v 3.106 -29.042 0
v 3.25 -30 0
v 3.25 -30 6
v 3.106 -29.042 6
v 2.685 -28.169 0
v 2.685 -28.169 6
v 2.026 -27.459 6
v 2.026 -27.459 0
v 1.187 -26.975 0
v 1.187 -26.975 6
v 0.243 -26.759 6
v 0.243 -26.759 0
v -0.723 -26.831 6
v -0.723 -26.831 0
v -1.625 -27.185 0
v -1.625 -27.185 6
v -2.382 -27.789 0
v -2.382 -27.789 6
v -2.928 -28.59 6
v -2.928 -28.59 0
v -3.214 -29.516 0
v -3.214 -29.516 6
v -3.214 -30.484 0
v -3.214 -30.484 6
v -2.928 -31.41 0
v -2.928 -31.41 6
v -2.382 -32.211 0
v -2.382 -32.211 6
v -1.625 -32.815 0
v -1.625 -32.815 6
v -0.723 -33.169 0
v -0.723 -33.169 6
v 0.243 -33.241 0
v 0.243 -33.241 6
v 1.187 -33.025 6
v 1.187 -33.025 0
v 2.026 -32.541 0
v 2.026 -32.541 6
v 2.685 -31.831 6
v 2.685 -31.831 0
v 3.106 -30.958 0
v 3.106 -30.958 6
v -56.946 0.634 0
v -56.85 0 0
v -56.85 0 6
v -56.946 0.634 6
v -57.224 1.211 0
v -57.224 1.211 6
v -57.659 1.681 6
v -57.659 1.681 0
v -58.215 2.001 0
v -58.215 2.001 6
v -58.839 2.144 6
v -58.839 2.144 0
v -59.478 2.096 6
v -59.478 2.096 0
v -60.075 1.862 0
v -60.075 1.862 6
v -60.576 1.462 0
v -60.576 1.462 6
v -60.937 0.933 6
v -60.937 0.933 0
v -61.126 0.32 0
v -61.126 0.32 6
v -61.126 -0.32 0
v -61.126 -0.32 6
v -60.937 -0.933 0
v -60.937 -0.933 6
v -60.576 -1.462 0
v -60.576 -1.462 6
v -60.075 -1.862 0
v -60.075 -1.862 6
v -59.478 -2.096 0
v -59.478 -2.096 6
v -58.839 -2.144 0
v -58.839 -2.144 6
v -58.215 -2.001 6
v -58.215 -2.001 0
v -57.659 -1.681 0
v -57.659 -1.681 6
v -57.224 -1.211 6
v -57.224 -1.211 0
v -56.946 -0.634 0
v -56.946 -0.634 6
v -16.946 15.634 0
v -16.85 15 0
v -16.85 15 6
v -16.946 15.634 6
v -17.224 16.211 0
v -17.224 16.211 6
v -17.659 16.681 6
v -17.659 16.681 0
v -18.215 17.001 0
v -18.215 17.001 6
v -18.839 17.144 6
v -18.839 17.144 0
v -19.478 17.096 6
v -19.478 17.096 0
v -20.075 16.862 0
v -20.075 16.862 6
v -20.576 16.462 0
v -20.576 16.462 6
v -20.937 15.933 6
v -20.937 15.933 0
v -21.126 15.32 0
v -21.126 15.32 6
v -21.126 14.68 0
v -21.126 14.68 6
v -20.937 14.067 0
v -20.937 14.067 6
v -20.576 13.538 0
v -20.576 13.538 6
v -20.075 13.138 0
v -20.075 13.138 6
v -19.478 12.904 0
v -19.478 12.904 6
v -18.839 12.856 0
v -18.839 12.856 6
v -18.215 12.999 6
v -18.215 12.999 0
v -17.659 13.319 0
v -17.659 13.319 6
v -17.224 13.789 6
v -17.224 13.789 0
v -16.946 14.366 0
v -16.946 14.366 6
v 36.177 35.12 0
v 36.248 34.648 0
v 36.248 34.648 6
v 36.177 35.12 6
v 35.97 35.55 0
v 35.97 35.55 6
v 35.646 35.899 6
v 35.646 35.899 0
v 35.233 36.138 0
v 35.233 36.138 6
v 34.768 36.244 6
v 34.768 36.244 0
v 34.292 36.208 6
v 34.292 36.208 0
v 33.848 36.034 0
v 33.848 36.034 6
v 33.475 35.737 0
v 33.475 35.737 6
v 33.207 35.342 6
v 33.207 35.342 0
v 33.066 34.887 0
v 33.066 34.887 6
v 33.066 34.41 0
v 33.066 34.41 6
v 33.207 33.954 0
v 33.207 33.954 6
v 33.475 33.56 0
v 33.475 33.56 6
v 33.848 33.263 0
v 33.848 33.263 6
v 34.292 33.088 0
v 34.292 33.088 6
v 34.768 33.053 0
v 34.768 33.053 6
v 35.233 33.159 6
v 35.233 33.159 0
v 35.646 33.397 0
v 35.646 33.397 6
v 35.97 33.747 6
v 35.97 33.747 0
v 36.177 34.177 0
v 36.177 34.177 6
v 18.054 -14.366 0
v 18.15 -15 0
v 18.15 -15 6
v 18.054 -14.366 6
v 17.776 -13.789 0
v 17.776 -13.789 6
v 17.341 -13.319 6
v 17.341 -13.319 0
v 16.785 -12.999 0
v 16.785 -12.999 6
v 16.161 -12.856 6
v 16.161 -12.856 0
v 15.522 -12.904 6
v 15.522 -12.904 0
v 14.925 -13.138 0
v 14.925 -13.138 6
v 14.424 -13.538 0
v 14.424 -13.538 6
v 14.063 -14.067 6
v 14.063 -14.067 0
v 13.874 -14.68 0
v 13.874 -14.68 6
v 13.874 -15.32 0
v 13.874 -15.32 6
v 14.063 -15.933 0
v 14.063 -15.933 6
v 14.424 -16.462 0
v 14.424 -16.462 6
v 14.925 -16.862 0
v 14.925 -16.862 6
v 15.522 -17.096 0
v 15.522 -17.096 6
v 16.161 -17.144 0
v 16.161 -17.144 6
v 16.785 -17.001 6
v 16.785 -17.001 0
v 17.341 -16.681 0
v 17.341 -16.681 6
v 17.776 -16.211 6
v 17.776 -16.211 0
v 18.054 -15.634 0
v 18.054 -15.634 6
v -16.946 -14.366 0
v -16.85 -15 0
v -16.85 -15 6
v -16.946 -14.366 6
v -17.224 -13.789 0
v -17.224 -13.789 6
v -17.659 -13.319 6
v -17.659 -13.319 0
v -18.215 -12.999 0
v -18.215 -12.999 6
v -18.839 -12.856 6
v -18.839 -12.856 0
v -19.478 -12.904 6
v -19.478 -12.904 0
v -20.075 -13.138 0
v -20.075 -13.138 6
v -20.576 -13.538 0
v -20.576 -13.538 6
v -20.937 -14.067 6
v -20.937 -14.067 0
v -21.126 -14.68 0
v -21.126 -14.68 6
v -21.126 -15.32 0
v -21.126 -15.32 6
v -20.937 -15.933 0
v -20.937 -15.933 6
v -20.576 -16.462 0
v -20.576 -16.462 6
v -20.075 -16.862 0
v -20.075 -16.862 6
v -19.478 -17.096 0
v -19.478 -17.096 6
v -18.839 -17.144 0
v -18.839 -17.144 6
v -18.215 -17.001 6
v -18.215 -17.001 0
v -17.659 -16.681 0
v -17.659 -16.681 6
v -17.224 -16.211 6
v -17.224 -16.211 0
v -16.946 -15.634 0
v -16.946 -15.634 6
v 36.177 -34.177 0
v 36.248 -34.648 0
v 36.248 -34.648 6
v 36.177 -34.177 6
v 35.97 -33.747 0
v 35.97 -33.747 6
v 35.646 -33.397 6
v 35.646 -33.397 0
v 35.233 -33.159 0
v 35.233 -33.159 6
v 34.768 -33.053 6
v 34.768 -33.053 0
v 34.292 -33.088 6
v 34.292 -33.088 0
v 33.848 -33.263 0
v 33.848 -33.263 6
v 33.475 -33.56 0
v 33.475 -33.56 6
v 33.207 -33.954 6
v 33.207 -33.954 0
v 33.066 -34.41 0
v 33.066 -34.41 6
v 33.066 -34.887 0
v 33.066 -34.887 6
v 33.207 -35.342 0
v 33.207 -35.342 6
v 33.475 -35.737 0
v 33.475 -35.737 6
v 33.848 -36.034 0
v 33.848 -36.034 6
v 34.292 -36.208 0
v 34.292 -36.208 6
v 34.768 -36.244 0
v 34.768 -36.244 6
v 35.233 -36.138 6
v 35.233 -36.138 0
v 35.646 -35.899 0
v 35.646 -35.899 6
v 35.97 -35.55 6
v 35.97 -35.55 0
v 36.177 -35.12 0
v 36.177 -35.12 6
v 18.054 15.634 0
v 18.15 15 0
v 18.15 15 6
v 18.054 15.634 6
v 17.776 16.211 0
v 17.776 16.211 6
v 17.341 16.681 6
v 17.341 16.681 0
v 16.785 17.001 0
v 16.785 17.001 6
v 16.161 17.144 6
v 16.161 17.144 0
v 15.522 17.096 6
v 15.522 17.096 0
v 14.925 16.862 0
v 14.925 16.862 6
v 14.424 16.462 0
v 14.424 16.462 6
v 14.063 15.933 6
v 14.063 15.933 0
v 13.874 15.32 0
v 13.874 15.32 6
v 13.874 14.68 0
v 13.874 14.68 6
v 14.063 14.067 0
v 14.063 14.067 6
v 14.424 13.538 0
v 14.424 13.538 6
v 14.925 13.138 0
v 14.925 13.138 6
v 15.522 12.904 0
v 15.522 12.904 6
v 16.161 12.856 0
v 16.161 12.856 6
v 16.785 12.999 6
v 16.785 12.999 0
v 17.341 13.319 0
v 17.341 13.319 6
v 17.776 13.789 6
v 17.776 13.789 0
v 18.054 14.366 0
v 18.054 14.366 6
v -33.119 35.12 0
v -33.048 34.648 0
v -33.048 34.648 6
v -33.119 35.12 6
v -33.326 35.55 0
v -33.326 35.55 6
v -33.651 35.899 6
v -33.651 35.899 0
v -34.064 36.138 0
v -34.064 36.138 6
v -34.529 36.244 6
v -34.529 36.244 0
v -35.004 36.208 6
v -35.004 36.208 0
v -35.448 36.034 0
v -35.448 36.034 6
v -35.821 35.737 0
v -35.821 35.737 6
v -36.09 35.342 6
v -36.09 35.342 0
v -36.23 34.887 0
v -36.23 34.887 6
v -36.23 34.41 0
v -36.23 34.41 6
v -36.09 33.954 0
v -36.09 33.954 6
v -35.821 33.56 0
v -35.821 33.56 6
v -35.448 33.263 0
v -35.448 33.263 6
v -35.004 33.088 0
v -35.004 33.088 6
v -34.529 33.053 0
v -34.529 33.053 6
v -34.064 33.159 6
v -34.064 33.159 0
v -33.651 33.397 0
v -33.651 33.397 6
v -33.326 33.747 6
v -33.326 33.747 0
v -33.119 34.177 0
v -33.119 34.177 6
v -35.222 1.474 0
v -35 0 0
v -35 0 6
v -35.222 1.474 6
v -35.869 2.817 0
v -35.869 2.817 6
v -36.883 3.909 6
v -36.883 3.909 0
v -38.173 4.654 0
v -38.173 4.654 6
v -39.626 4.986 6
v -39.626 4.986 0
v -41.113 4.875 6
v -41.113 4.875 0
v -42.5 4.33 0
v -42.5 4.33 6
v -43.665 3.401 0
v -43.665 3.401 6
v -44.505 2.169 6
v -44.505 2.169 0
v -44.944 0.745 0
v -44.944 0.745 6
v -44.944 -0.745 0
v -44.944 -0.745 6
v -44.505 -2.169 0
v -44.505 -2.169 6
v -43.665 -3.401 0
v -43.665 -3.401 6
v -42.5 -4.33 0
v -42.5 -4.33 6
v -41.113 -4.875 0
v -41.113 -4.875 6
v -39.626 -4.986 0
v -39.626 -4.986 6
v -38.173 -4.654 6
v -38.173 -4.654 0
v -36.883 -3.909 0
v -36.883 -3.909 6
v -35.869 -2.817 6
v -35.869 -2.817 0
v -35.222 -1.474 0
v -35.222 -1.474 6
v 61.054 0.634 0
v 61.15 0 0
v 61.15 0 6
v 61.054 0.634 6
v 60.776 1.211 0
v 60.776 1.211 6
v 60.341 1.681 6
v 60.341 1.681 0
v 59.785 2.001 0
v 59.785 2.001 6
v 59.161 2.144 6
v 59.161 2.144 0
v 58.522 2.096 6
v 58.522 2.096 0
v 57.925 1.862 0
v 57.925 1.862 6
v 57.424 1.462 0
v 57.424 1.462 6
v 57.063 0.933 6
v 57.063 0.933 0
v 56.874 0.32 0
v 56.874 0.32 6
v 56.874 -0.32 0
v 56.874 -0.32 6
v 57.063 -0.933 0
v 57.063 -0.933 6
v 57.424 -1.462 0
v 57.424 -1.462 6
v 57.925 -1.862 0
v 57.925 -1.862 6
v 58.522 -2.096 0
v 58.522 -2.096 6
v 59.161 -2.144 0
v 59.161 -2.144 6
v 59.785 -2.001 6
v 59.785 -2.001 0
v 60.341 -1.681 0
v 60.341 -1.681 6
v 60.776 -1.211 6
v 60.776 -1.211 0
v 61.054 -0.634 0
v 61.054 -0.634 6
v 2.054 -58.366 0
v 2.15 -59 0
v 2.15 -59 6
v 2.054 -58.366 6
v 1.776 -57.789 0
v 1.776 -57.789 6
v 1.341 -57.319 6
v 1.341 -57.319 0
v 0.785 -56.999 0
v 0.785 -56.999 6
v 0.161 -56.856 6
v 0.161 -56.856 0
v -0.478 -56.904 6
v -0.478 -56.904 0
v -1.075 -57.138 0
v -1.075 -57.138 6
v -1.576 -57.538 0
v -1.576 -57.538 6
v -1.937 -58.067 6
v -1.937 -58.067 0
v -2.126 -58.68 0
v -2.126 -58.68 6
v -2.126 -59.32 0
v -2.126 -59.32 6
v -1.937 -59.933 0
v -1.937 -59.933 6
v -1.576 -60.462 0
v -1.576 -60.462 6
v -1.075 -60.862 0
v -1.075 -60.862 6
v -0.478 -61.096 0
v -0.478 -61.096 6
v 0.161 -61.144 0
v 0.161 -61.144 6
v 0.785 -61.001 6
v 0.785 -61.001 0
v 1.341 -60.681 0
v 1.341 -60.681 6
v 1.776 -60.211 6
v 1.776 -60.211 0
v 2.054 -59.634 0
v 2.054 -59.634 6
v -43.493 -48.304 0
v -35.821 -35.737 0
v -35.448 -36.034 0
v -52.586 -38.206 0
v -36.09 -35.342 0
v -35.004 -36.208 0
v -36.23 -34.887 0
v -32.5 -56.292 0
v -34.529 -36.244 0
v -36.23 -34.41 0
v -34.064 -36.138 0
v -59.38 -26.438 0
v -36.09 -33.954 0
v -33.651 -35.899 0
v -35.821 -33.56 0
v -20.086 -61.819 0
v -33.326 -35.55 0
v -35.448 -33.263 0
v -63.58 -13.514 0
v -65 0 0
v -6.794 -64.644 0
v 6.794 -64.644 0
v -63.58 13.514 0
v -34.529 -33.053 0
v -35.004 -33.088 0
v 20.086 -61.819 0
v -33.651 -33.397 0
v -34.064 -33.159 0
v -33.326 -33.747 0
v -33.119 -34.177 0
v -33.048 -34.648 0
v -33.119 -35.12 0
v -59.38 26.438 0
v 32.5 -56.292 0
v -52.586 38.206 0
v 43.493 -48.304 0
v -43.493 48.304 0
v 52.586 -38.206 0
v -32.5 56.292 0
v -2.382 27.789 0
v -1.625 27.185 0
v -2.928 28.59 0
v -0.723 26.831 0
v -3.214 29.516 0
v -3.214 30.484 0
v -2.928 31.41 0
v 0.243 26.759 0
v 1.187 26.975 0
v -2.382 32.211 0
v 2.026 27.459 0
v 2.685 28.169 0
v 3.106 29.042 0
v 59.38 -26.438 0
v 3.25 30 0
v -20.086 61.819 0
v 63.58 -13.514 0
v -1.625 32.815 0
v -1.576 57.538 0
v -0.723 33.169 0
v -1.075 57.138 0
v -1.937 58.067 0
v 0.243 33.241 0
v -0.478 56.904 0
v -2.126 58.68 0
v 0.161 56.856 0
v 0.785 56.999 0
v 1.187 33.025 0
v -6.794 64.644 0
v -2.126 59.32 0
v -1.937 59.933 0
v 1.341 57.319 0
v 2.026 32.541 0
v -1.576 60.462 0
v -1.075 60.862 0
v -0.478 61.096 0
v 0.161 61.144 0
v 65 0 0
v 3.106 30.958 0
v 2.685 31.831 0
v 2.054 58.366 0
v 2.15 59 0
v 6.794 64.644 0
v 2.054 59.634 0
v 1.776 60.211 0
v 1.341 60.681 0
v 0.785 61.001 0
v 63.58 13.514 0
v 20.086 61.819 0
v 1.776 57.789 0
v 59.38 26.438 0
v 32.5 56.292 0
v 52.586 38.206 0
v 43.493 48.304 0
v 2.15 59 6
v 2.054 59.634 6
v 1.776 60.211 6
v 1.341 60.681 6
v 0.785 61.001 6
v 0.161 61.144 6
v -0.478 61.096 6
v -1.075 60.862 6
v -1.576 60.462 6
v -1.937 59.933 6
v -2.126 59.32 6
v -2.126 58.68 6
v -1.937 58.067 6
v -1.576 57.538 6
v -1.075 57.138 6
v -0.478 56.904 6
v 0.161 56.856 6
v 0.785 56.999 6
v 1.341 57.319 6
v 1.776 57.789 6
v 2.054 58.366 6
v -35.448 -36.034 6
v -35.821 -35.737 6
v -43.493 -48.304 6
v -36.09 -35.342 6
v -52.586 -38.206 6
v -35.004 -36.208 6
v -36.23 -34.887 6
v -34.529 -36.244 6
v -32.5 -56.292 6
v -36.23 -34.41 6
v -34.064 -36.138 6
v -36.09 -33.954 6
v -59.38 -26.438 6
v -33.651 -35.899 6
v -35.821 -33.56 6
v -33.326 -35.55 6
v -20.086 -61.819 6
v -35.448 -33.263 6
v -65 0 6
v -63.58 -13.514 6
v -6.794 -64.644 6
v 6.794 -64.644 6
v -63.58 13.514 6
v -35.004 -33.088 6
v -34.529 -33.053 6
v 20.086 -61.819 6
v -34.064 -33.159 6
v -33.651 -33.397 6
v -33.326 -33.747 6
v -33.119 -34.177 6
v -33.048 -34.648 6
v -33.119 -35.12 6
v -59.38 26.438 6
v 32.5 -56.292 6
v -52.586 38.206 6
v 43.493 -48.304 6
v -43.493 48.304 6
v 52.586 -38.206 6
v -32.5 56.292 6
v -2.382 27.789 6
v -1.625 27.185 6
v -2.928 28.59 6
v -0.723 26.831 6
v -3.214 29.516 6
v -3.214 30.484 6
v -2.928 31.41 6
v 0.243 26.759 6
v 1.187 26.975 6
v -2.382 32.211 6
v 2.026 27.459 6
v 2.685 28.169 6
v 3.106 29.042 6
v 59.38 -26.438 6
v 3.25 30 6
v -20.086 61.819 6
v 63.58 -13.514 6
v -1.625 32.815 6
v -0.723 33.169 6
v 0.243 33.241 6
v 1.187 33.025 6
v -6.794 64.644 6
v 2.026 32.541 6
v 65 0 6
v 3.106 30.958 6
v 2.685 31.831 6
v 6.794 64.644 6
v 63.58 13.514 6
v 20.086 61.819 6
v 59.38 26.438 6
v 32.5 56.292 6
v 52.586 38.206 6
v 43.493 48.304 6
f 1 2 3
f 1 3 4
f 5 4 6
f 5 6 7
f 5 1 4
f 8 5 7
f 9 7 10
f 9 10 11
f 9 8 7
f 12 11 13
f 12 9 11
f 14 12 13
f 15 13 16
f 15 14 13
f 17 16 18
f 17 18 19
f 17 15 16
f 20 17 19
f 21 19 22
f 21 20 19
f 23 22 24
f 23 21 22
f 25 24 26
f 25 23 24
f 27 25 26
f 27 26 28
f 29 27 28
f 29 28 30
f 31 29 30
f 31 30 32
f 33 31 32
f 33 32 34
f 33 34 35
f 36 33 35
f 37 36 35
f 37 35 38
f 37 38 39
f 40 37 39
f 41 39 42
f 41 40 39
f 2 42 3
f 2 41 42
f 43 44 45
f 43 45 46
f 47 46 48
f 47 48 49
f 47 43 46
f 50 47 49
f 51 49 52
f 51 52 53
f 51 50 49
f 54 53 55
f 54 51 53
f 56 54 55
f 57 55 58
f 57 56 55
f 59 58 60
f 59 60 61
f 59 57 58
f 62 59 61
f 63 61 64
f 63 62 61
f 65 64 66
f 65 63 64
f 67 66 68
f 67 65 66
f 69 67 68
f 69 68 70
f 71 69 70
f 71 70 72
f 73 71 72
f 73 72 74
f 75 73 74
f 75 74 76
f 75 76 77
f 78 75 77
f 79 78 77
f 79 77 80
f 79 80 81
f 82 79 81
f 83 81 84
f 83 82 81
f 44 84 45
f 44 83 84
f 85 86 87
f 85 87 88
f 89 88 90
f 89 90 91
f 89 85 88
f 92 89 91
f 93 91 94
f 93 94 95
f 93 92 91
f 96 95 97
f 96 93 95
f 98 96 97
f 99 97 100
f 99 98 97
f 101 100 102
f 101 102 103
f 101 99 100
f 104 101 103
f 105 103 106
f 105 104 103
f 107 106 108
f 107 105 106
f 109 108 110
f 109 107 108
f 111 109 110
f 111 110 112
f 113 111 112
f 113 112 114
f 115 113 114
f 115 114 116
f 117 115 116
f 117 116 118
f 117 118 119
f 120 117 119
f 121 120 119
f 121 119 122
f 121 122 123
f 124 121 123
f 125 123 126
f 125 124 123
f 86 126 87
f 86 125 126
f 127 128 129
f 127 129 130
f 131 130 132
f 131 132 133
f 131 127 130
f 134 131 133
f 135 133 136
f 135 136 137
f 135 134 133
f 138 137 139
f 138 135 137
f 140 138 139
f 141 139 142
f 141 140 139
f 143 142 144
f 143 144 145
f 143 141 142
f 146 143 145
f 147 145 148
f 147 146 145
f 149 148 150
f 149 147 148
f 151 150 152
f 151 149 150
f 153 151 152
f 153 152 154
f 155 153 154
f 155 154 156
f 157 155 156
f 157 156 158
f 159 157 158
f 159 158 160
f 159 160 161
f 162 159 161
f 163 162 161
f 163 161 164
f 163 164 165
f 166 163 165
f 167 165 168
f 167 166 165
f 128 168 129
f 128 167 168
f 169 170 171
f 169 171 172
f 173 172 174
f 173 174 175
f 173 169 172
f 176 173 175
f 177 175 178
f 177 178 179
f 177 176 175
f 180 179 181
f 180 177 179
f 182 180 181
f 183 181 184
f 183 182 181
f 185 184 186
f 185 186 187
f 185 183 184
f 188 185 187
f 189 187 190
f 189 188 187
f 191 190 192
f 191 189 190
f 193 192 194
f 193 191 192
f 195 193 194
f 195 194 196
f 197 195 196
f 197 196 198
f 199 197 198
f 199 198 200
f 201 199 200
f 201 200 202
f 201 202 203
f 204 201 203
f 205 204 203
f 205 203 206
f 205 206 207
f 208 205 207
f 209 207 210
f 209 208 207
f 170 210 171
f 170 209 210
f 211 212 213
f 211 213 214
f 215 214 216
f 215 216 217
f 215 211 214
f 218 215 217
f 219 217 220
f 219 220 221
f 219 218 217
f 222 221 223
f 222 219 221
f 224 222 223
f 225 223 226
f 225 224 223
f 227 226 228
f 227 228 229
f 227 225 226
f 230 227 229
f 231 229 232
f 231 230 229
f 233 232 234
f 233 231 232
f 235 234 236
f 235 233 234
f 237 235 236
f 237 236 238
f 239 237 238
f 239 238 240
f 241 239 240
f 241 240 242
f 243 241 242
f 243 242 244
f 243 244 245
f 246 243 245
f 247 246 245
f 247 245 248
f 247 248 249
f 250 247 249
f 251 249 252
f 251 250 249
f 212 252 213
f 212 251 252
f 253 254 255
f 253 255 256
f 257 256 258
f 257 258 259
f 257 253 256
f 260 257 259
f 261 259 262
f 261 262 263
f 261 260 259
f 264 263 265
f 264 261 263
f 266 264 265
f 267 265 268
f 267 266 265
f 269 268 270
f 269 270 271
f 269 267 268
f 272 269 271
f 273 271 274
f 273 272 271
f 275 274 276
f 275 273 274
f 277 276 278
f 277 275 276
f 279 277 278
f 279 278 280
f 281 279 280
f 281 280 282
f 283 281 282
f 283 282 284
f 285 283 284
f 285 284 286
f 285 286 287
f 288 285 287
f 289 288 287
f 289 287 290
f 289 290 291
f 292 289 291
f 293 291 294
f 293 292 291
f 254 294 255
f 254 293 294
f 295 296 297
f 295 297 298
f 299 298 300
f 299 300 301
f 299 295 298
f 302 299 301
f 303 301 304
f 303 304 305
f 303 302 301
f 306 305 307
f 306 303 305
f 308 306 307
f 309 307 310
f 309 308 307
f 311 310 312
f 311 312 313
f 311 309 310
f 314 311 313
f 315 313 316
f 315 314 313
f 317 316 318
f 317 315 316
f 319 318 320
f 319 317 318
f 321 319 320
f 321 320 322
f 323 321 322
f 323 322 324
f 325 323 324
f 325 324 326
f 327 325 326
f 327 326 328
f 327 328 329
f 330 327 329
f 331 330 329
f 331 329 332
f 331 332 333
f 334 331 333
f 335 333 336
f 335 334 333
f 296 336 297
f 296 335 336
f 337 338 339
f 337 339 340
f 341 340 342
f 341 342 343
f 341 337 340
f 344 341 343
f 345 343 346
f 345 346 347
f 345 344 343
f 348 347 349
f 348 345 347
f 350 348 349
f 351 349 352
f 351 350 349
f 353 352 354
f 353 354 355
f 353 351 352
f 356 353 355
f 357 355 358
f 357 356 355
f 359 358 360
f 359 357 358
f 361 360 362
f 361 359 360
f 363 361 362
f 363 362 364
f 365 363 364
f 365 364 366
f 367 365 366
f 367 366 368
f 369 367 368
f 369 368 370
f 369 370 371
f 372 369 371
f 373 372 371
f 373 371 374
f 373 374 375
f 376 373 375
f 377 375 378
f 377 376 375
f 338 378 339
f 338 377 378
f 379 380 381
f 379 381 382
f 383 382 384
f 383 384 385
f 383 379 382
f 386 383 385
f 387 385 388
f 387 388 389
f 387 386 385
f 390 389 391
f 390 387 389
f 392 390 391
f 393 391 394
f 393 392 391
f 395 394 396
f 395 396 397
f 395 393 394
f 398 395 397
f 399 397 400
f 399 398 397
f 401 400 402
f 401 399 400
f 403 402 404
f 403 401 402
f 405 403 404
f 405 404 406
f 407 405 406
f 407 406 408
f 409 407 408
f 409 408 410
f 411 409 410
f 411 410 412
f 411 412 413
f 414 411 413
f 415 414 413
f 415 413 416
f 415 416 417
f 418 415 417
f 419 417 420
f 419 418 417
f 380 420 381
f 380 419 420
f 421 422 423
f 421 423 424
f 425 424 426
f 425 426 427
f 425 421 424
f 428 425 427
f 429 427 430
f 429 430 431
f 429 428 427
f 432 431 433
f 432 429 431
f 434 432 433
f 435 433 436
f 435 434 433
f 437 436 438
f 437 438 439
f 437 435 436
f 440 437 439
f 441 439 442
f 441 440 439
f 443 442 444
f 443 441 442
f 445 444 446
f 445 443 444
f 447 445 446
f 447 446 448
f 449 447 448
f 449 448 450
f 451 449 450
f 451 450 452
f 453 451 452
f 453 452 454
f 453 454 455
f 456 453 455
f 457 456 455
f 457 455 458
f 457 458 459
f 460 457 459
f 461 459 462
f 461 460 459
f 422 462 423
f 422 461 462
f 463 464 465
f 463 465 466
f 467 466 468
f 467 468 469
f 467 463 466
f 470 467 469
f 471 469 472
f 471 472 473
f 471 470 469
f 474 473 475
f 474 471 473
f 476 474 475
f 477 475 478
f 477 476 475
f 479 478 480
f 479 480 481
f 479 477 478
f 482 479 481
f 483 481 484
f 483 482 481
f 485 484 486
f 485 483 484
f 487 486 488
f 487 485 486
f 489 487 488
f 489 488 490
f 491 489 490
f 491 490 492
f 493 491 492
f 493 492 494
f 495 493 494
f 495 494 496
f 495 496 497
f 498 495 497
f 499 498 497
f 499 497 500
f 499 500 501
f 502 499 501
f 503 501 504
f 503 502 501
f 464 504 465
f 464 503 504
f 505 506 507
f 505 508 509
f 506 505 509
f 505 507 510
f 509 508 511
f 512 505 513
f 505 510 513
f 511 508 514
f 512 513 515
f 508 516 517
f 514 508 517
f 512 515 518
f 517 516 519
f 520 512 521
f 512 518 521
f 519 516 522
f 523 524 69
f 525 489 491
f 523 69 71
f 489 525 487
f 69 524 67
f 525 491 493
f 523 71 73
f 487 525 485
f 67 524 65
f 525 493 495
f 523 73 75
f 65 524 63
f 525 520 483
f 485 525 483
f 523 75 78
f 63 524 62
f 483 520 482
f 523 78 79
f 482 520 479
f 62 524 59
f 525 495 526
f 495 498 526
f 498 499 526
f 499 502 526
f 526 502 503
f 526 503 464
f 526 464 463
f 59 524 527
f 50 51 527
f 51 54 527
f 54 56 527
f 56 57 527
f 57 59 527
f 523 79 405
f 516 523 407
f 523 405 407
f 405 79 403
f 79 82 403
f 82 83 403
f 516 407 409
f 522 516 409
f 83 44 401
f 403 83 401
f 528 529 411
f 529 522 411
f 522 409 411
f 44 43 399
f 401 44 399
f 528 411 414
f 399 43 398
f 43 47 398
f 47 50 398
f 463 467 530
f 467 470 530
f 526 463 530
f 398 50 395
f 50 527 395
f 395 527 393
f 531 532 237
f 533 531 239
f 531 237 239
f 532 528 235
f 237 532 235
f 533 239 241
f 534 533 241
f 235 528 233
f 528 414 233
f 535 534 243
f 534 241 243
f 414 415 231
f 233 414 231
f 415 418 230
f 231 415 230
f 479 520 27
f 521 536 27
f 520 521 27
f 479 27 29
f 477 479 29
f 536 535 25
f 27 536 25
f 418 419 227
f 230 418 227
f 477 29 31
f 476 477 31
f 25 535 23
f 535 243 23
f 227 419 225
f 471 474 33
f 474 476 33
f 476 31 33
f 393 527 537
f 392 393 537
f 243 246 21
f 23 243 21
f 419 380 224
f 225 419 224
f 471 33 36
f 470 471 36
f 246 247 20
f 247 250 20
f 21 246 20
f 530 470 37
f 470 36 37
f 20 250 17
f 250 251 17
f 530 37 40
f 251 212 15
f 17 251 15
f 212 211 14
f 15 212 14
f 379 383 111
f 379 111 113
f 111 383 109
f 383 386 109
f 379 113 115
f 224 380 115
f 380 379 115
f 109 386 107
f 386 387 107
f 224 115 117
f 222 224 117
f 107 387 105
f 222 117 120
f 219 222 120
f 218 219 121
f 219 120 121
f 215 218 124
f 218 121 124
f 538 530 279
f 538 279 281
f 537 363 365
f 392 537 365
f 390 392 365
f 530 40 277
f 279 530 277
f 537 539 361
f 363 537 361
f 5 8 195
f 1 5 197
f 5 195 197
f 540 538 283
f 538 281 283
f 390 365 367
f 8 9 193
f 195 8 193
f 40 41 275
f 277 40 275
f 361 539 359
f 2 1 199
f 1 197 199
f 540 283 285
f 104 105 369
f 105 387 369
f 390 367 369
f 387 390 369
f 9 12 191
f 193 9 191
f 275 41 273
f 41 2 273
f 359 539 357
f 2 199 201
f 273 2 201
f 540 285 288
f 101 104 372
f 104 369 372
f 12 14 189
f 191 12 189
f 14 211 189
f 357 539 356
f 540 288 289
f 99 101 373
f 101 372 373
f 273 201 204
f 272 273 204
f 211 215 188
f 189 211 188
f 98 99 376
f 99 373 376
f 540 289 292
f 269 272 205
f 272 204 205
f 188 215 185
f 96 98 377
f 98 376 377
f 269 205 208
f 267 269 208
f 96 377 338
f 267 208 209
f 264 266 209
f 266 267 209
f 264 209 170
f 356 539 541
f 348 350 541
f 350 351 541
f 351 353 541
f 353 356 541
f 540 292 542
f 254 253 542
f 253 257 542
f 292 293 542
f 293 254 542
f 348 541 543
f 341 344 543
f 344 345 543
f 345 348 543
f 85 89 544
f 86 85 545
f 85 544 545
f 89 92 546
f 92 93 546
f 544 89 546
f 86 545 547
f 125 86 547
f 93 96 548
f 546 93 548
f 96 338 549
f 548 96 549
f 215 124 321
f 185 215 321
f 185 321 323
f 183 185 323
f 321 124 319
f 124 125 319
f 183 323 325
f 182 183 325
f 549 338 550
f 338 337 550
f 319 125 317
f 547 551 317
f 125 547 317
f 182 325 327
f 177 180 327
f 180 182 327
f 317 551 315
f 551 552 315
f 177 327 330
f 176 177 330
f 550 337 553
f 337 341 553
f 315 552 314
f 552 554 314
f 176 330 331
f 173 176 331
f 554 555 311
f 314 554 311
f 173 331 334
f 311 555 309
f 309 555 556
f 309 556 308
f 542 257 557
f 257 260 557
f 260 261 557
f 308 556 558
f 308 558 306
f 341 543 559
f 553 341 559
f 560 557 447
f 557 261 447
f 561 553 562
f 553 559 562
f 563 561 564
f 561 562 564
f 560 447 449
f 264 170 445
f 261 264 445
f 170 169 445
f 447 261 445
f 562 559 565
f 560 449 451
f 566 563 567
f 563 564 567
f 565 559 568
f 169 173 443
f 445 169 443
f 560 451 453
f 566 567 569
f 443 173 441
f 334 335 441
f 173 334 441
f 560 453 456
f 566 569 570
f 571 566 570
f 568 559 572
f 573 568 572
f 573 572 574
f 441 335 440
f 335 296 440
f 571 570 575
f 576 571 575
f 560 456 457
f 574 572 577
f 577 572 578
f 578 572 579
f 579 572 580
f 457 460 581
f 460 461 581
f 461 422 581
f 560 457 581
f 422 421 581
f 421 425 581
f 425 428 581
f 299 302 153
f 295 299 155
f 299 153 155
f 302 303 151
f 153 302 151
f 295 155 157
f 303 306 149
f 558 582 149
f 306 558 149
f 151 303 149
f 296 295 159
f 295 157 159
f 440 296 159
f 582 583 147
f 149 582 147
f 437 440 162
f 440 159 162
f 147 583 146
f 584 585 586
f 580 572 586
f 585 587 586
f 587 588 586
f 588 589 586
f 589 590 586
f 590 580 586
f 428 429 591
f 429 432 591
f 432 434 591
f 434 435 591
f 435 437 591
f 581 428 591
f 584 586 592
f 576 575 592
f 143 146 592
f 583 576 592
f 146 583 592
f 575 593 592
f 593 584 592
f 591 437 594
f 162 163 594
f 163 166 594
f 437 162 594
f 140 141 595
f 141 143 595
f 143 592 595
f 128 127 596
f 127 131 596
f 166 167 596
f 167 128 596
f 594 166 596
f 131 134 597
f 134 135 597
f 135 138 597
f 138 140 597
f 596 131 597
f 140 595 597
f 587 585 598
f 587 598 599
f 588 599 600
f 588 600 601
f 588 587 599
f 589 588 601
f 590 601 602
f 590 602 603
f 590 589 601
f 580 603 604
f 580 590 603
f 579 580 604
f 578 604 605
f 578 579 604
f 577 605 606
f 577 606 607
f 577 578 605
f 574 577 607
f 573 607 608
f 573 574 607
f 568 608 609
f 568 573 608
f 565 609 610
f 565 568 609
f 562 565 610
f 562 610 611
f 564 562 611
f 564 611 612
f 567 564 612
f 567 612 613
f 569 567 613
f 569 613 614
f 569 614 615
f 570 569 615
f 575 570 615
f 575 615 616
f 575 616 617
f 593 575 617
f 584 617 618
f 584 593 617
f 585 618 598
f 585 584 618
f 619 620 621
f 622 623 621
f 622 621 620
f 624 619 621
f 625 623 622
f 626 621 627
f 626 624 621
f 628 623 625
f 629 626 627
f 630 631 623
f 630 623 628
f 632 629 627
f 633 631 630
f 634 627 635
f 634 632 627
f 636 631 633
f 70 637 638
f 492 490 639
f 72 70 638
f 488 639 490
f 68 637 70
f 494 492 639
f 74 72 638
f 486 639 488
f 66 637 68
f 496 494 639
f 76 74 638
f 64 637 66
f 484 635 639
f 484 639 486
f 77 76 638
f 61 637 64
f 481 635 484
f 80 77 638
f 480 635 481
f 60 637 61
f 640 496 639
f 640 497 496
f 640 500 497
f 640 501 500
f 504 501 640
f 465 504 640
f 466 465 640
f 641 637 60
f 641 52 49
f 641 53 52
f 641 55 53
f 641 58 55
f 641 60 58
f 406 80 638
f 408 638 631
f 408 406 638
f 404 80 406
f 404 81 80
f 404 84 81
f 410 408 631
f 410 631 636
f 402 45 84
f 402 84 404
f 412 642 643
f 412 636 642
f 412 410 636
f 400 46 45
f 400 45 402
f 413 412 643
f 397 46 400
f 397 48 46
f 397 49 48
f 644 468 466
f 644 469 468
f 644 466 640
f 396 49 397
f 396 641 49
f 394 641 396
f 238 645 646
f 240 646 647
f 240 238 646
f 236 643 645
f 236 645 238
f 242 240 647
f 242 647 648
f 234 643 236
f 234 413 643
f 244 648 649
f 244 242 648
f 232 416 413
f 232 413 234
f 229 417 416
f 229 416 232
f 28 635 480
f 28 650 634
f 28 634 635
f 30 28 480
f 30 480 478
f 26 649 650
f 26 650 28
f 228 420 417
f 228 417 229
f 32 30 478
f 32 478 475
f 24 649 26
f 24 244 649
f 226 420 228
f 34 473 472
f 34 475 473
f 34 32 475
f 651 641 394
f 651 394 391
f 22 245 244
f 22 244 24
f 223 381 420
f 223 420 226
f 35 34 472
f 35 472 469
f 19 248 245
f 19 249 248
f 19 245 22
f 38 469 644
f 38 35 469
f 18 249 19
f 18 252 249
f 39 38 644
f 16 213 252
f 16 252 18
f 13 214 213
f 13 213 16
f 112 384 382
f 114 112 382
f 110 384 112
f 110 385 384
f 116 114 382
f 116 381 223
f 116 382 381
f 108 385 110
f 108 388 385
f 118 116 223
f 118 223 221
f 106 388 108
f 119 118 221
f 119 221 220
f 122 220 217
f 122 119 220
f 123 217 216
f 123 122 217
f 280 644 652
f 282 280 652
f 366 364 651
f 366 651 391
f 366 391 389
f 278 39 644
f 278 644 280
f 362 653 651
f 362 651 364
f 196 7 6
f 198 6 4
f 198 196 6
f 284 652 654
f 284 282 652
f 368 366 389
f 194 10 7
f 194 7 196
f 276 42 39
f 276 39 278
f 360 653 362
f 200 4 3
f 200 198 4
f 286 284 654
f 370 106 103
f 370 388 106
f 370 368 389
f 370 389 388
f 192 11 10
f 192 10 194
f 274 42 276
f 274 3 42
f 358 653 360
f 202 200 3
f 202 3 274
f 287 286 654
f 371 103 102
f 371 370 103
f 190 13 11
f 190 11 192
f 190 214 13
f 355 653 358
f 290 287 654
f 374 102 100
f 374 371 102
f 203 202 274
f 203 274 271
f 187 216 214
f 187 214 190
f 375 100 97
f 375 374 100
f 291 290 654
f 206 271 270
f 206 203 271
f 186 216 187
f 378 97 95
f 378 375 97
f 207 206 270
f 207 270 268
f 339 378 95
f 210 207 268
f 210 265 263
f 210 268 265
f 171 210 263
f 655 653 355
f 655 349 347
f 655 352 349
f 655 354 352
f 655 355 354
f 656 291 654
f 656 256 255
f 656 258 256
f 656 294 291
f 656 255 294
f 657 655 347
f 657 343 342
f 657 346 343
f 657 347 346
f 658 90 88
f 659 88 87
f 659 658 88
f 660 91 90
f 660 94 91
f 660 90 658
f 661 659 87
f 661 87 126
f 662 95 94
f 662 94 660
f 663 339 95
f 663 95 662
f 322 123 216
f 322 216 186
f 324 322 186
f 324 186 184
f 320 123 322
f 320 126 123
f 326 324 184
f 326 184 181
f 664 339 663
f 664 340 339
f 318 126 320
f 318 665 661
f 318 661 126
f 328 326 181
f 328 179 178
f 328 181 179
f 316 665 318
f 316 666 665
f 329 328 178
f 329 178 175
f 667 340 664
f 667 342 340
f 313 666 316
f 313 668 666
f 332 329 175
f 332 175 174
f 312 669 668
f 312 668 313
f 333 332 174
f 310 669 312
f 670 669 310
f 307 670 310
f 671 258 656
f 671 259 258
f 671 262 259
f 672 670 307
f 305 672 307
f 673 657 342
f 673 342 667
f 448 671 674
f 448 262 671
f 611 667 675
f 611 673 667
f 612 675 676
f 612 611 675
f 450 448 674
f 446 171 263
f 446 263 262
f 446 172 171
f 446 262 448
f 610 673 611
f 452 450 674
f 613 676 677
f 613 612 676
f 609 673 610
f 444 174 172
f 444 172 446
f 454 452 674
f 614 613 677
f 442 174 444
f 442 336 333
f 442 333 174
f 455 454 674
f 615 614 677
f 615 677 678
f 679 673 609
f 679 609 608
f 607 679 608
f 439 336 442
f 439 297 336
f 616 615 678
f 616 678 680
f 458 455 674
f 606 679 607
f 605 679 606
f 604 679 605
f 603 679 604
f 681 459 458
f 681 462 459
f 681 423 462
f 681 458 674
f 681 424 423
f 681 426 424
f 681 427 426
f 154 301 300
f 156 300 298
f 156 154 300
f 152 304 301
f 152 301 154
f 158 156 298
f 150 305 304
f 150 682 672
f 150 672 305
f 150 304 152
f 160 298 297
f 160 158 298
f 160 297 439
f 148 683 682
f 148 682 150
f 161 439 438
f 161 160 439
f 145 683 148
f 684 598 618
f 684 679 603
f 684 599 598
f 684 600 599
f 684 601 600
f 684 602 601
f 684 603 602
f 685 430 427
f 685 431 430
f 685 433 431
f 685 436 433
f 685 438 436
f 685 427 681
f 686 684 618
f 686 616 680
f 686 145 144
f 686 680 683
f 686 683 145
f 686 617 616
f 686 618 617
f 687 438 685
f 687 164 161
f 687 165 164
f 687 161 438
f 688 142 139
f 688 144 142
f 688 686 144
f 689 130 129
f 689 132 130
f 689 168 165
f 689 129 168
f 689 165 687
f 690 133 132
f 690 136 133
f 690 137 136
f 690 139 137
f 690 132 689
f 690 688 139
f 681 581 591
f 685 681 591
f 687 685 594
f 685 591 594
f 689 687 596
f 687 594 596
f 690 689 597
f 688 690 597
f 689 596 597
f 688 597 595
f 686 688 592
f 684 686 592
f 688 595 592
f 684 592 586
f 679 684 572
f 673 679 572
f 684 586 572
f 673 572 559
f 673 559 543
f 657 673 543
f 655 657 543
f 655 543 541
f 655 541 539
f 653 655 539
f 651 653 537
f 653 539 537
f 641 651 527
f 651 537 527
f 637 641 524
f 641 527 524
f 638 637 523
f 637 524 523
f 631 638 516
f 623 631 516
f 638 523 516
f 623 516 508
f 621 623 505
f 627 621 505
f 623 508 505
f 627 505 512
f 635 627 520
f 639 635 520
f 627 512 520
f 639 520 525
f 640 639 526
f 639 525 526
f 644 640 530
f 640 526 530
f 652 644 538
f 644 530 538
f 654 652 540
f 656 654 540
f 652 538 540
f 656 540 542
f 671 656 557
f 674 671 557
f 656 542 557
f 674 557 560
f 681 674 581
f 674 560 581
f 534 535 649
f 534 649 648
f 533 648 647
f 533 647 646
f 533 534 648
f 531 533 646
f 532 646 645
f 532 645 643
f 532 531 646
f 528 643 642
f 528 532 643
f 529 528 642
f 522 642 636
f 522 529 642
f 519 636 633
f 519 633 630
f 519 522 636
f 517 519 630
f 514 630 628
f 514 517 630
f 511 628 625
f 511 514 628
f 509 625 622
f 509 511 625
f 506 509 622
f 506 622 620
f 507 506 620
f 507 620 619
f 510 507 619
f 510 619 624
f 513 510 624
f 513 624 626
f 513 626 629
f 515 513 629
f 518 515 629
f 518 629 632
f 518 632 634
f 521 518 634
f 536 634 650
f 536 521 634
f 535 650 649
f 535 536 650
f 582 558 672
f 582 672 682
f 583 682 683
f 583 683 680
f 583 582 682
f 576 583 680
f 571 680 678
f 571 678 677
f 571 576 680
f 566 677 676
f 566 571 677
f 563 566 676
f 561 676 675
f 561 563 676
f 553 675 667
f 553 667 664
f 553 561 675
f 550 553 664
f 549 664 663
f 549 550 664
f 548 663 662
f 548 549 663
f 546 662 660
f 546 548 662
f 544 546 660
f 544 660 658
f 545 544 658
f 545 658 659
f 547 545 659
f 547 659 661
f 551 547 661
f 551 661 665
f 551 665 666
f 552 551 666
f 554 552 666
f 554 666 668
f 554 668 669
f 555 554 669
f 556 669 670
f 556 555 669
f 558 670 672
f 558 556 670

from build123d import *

# Parameters (mm, degrees)
SKETCH_1_R      = 65
SKETCH_1_R_2    = 1.6
SKETCH_1_R_3    = 2.15
SKETCH_1_R_4    = 3.25
SKETCH_1_R_5    = 5
EXTRUDE_1_DEPTH = 6


with BuildPart() as part:
    # 草圖1 → 填料-伸長1 (new body)
    with BuildSketch(Plane.XY):
        Circle(SKETCH_1_R)
        with Locations((34.648232278, 34.648232278)):
            Circle(SKETCH_1_R_2, mode=Mode.SUBTRACT)
        with Locations((-34.648232278, 34.648232278)):
            Circle(SKETCH_1_R_2, mode=Mode.SUBTRACT)
        with Locations((-34.648232278, -34.648232278)):
            Circle(SKETCH_1_R_2, mode=Mode.SUBTRACT)
        with Locations((34.648232278, -34.648232278)):
            Circle(SKETCH_1_R_2, mode=Mode.SUBTRACT)
        with Locations((59, 0)):
            Circle(SKETCH_1_R_3, mode=Mode.SUBTRACT)
        with Locations((0, 59)):
            Circle(SKETCH_1_R_3, mode=Mode.SUBTRACT)
        with Locations((-59, 0)):
            Circle(SKETCH_1_R_3, mode=Mode.SUBTRACT)
        with Locations((0, -59)):
            Circle(SKETCH_1_R_3, mode=Mode.SUBTRACT)
        with Locations((-19, 15)):
            Circle(SKETCH_1_R_3, mode=Mode.SUBTRACT)
        with Locations((-19, -15)):
            Circle(SKETCH_1_R_3, mode=Mode.SUBTRACT)
        with Locations((16, 15)):
            Circle(SKETCH_1_R_3, mode=Mode.SUBTRACT)
        with Locations((16, -15)):
            Circle(SKETCH_1_R_3, mode=Mode.SUBTRACT)
        with Locations((0, 30)):
            Circle(SKETCH_1_R_4, mode=Mode.SUBTRACT)
        with Locations((0, -30)):
            Circle(SKETCH_1_R_4, mode=Mode.SUBTRACT)
        with Locations((-40, 0)):
            Circle(SKETCH_1_R_5, mode=Mode.SUBTRACT)
    extrude(amount=EXTRUDE_1_DEPTH)


solid = part.part
